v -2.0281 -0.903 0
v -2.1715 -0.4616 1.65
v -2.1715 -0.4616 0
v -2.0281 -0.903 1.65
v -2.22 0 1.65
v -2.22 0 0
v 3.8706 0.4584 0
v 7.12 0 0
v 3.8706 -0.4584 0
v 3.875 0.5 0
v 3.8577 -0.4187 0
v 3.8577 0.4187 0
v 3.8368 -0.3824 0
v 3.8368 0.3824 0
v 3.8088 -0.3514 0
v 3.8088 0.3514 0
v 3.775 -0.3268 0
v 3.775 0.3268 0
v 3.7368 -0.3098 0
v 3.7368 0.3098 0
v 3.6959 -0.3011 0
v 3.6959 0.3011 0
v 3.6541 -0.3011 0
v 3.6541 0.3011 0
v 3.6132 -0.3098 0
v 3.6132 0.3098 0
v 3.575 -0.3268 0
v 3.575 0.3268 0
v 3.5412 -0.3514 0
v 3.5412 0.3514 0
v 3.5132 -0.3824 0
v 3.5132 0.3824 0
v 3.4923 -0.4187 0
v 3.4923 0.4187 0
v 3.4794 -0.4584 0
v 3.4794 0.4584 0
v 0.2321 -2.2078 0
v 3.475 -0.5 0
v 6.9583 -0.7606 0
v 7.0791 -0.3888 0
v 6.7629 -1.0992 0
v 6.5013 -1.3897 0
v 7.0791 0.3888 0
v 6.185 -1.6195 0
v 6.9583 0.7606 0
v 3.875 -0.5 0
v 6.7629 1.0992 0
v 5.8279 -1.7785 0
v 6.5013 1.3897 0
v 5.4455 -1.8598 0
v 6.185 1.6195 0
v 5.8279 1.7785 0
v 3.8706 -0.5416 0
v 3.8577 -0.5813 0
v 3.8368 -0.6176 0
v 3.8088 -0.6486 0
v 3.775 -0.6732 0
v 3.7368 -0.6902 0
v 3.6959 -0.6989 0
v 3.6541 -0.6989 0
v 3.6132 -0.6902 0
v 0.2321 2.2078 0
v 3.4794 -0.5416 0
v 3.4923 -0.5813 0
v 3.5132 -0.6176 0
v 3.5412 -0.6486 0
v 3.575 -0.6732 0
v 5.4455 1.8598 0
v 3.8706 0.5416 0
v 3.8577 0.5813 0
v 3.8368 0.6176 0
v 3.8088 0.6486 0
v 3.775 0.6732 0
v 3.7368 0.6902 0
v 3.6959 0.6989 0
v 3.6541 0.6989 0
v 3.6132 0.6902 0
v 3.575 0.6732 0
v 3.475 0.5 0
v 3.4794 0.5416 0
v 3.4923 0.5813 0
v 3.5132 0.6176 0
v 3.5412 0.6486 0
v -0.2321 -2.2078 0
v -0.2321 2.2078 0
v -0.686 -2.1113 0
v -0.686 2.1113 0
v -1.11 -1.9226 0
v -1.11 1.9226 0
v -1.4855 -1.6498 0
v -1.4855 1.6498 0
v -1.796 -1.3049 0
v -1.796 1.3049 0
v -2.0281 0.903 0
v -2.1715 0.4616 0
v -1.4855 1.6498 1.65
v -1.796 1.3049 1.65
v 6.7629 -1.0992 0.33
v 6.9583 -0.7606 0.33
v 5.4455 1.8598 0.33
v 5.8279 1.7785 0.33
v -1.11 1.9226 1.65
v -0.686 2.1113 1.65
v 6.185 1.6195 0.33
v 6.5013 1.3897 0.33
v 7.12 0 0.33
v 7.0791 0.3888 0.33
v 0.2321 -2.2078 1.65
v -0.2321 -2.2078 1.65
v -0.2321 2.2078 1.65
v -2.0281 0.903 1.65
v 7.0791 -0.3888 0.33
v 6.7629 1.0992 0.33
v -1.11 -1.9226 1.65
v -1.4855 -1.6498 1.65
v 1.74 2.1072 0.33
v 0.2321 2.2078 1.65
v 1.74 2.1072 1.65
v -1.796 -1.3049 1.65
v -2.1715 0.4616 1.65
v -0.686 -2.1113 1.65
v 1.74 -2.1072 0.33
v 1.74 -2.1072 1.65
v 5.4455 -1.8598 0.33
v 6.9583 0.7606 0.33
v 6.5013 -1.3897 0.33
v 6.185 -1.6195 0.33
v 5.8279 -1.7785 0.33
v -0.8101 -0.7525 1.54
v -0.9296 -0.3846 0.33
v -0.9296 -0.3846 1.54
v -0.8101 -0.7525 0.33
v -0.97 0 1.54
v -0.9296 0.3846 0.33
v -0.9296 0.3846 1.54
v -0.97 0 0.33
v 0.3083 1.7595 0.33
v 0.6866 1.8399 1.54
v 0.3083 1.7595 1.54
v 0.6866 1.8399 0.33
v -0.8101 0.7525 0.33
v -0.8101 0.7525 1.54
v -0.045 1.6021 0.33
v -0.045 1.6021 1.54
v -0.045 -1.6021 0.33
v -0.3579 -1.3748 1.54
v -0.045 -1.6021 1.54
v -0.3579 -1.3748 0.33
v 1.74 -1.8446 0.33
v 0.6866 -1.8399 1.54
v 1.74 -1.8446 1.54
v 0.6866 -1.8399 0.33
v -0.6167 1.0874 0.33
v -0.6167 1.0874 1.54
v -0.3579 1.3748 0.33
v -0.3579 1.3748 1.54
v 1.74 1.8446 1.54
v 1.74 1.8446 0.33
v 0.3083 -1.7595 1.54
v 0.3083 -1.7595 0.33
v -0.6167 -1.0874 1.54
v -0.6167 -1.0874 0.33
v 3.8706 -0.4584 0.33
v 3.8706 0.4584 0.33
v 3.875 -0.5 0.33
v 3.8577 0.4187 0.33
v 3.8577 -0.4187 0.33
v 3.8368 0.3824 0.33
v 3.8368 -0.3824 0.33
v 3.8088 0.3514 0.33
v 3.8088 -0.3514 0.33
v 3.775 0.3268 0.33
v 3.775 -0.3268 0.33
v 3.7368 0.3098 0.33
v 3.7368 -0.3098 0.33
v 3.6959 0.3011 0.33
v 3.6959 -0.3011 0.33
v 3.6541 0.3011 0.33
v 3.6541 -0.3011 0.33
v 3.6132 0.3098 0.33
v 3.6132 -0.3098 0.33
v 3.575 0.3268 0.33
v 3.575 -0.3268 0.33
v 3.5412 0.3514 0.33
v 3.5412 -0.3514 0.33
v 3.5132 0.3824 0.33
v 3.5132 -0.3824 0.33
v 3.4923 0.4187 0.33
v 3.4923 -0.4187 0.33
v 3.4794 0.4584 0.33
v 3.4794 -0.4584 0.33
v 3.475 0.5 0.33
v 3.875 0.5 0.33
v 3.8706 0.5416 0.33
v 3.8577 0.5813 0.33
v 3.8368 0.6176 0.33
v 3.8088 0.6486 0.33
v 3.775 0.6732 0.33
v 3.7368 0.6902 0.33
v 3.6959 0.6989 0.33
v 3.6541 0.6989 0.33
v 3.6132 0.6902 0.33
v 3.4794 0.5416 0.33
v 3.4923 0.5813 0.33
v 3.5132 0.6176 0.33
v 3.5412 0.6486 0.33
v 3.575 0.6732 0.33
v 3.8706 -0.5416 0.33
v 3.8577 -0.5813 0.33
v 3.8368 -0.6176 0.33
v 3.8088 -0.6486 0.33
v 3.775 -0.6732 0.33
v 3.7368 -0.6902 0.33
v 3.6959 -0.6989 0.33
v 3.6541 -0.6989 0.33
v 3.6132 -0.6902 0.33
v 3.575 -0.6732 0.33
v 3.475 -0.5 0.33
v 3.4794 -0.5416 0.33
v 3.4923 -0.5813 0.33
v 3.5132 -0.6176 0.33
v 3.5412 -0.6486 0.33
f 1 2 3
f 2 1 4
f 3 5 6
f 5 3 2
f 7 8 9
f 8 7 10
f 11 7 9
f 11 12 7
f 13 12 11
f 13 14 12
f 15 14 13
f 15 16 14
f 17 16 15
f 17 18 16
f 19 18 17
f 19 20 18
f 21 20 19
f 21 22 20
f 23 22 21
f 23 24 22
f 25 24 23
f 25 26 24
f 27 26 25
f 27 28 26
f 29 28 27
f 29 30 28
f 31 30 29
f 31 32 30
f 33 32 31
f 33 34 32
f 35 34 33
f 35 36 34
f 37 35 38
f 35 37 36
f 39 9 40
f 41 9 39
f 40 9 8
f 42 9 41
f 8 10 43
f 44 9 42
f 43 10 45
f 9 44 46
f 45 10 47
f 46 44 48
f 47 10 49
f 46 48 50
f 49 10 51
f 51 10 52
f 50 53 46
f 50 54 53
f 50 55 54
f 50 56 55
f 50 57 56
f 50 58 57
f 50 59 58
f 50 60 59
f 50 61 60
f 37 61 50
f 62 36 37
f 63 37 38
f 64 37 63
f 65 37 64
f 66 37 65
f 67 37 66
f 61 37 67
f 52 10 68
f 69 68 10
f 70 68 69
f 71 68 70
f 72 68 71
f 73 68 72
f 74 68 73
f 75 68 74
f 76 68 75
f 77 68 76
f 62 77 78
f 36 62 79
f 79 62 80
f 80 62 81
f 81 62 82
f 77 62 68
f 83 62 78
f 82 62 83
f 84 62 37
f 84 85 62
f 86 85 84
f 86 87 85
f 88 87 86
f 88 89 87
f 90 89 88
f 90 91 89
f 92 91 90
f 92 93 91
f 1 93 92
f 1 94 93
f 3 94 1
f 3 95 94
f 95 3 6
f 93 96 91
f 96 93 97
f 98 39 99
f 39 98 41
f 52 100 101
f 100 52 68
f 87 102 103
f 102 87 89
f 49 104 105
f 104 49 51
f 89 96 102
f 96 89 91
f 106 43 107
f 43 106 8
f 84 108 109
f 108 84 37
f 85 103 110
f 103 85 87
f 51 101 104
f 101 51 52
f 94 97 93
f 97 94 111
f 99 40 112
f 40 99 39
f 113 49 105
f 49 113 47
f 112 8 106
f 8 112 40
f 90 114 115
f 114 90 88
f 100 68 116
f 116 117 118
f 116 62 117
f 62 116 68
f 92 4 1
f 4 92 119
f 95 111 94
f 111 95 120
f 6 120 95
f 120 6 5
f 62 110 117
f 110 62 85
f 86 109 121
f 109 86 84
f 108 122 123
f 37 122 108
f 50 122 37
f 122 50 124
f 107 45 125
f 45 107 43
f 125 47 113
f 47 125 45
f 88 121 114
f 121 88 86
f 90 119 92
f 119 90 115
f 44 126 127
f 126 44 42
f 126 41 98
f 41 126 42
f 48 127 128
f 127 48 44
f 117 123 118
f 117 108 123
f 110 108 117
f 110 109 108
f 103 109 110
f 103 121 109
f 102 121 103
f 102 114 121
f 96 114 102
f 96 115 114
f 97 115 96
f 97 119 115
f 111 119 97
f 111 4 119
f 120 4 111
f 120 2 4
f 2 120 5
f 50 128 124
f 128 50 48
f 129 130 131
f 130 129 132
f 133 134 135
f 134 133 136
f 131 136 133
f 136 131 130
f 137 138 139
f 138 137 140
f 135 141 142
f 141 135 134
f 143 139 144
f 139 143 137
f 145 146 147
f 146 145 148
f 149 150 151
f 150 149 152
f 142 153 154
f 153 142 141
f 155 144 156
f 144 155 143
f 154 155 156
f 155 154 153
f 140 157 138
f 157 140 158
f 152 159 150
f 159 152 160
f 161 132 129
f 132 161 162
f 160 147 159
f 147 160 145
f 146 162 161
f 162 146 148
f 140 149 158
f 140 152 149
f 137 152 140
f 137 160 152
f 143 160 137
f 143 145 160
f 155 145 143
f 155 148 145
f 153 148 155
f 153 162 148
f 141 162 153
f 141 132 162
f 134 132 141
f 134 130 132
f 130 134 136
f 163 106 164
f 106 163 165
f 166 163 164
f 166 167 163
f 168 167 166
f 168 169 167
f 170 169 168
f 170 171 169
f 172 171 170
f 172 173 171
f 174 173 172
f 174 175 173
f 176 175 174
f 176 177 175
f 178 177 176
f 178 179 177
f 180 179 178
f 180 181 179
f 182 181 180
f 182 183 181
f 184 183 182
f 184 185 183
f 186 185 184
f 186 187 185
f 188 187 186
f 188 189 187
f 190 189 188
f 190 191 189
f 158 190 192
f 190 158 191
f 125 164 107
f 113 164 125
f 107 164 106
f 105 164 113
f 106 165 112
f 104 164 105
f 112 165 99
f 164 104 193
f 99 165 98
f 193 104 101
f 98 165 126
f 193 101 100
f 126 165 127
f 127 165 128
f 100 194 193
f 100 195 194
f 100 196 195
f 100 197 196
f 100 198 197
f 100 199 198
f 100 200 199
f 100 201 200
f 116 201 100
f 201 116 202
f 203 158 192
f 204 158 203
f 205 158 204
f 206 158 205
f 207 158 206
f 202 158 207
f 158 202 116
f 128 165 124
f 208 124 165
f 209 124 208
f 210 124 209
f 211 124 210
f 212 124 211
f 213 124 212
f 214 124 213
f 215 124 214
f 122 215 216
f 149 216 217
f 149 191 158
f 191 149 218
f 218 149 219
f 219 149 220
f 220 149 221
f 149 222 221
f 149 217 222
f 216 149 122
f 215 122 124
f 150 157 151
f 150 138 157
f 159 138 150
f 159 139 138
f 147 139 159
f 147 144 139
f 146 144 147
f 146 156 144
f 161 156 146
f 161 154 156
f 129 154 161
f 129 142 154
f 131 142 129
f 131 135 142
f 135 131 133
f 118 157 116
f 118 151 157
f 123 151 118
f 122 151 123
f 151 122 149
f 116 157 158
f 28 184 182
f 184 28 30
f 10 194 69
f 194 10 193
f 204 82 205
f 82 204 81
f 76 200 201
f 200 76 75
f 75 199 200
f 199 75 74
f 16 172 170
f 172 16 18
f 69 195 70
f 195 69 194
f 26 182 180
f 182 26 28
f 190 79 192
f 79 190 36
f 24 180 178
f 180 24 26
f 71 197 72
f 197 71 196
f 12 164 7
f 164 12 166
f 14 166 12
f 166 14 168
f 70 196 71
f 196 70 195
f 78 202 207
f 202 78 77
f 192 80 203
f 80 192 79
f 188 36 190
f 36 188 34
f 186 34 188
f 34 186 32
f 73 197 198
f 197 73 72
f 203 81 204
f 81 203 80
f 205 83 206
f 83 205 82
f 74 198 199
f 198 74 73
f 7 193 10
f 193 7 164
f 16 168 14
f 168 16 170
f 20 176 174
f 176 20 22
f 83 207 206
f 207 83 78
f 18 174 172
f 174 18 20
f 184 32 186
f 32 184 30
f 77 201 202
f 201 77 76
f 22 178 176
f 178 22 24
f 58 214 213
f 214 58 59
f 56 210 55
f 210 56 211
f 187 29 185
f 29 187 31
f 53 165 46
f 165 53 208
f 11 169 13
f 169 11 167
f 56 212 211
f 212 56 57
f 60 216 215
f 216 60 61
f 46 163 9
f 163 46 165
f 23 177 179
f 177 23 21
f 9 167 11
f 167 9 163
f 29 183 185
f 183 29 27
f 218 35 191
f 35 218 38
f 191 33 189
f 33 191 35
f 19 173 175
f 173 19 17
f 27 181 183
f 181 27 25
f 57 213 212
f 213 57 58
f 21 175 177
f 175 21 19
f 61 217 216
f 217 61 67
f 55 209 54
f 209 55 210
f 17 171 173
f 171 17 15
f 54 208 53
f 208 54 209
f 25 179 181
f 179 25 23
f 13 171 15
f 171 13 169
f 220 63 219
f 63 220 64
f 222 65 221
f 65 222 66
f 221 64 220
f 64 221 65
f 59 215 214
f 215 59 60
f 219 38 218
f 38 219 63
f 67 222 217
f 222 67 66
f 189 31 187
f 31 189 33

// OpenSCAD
// Measures of the telecommand in centimeters.
R1 = 3.4/2;         // Small top radius.
R2 = 3.7/2;         // Big bottom radius.
L  = 8;             // Total length (includes radius).
H  = 1.1;           // Total height.
W = L - R1 - R2;    // Width without the top and bottom circles.

// Measures of the carrier in centimeters.
H_CARRIER = 1.5 * H;                // Total height.
L_CARRIER = 1.1 * L ;               // Total length (includes radius).
R1_CARRIER = R1 + R1/10;            // Top radius.
R2_CARRIER = R2 + R2/5;             // Bottom radius.
W_CARRIER = L_CARRIER - R1 - R2;    // Width without the top and bottom circles.
L_OFFSET = L_CARRIER / 10;          // Offset for the hole (x-axis).
H_OFFSET = 0.20 * H_CARRIER;        // Offset for the hole (z-axis).
L_LEGS = 0.45 * L_CARRIER;          // Size of the front side.
R_SCREWS = 0.2;                     // Size of the hole for the screws.
SCREW_Y_OFFSET = 0.5;               // Offset for the screws hole (y_axis).

$fn=30;

module Base2dShape(top_radius, bottom_radius, length) {
    hull() {
        circle(bottom_radius);
        translate([length, 0, 0]) circle(top_radius);
    }
}

module telecommand(top_radius=R1, bottom_radius=R2, width=W, height=H) {
    linear_extrude(height) Base2dShape(top_radius, bottom_radius, width);
}

module carrier() {
    max_radius = max(R1_CARRIER, R2_CARRIER);
    legs_offset = L_LEGS - R2_CARRIER;
    difference() {
        linear_extrude(H_CARRIER) Base2dShape(R1_CARRIER, R2_CARRIER, W_CARRIER);
        translate([L_OFFSET, 0, H_OFFSET]) telecommand(1.1 * R1, R2, W, 1.1*H);  // Remove slightly bigger telecommand.
        translate([legs_offset, -max_radius, H_OFFSET]) cube([L_CARRIER, 2 * max_radius, H_CARRIER]);  // Make legs.
        translate([0.7 * W_CARRIER, SCREW_Y_OFFSET, -0.1 * H_CARRIER]) cylinder(2 * H_OFFSET, r=R_SCREWS);  // Left screw.
        translate([0.7 * W_CARRIER, -SCREW_Y_OFFSET, -0.1 * H_CARRIER]) cylinder(2 * H_OFFSET, r=R_SCREWS);  // Right screw.
    }
}

// main();
// # translate([L_OFFSET, 0, H_OFFSET]) telecommand();
carrier();
